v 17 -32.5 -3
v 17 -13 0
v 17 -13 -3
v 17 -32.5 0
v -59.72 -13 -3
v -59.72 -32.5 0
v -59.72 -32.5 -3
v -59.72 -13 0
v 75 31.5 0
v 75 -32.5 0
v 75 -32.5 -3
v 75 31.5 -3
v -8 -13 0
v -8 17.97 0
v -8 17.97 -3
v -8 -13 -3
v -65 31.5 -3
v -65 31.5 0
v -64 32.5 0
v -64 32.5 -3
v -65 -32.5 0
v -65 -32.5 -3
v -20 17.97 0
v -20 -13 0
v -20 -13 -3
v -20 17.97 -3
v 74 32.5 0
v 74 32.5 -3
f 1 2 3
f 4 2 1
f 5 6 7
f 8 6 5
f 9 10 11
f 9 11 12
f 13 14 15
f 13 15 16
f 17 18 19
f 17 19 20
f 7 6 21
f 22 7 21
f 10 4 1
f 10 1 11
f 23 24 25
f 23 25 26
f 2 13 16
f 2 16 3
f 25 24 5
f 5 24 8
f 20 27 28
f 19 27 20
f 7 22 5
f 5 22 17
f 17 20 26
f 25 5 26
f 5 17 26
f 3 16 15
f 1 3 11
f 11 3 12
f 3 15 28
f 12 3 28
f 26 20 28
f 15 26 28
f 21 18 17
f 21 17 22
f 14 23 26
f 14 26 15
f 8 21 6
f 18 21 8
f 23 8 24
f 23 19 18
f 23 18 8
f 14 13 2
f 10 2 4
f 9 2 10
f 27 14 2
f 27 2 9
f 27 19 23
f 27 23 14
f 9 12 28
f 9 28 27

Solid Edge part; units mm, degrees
sketch "Sketch1" plane through (0, 0, 0) normal (0, 0, 1) x (1, 0, 0)
  line L0 (75, 32.5) -> (-65, 32.5)
  line L1 (-65, 32.5) -> (-65, -32.5)
  line L2 (-59.72, -32.5) -> (-65, -32.5)
  line L3 (-59.72, -32.5) -> (-59.72, -13)
  line L4 (-20, -13) -> (-59.72, -13)
  line L5 (-20, -13) -> (-20, 17.97)
  line L6 (-20, 17.97) -> (-8, 17.97)
  line L7 (-8, 17.97) -> (-8, -13)
  line L8 (-8, -13) -> (17, -13)
  line L9 (17, -13) -> (17, -32.5)
  line L10 (17, -32.5) -> (75, -32.5)
  line L11 (75, -32.5) -> (75, 32.5)
extrude "Protrusion1" add sketch "Sketch1" against normal blind 3
chamfer "Chanfro_1" distance 1 angle 45 1 edges at (75, 32.5, -1.5)
chamfer "Chanfro_2" distance 1 angle 45 1 edges at (-65, 32.5, -1.5)
